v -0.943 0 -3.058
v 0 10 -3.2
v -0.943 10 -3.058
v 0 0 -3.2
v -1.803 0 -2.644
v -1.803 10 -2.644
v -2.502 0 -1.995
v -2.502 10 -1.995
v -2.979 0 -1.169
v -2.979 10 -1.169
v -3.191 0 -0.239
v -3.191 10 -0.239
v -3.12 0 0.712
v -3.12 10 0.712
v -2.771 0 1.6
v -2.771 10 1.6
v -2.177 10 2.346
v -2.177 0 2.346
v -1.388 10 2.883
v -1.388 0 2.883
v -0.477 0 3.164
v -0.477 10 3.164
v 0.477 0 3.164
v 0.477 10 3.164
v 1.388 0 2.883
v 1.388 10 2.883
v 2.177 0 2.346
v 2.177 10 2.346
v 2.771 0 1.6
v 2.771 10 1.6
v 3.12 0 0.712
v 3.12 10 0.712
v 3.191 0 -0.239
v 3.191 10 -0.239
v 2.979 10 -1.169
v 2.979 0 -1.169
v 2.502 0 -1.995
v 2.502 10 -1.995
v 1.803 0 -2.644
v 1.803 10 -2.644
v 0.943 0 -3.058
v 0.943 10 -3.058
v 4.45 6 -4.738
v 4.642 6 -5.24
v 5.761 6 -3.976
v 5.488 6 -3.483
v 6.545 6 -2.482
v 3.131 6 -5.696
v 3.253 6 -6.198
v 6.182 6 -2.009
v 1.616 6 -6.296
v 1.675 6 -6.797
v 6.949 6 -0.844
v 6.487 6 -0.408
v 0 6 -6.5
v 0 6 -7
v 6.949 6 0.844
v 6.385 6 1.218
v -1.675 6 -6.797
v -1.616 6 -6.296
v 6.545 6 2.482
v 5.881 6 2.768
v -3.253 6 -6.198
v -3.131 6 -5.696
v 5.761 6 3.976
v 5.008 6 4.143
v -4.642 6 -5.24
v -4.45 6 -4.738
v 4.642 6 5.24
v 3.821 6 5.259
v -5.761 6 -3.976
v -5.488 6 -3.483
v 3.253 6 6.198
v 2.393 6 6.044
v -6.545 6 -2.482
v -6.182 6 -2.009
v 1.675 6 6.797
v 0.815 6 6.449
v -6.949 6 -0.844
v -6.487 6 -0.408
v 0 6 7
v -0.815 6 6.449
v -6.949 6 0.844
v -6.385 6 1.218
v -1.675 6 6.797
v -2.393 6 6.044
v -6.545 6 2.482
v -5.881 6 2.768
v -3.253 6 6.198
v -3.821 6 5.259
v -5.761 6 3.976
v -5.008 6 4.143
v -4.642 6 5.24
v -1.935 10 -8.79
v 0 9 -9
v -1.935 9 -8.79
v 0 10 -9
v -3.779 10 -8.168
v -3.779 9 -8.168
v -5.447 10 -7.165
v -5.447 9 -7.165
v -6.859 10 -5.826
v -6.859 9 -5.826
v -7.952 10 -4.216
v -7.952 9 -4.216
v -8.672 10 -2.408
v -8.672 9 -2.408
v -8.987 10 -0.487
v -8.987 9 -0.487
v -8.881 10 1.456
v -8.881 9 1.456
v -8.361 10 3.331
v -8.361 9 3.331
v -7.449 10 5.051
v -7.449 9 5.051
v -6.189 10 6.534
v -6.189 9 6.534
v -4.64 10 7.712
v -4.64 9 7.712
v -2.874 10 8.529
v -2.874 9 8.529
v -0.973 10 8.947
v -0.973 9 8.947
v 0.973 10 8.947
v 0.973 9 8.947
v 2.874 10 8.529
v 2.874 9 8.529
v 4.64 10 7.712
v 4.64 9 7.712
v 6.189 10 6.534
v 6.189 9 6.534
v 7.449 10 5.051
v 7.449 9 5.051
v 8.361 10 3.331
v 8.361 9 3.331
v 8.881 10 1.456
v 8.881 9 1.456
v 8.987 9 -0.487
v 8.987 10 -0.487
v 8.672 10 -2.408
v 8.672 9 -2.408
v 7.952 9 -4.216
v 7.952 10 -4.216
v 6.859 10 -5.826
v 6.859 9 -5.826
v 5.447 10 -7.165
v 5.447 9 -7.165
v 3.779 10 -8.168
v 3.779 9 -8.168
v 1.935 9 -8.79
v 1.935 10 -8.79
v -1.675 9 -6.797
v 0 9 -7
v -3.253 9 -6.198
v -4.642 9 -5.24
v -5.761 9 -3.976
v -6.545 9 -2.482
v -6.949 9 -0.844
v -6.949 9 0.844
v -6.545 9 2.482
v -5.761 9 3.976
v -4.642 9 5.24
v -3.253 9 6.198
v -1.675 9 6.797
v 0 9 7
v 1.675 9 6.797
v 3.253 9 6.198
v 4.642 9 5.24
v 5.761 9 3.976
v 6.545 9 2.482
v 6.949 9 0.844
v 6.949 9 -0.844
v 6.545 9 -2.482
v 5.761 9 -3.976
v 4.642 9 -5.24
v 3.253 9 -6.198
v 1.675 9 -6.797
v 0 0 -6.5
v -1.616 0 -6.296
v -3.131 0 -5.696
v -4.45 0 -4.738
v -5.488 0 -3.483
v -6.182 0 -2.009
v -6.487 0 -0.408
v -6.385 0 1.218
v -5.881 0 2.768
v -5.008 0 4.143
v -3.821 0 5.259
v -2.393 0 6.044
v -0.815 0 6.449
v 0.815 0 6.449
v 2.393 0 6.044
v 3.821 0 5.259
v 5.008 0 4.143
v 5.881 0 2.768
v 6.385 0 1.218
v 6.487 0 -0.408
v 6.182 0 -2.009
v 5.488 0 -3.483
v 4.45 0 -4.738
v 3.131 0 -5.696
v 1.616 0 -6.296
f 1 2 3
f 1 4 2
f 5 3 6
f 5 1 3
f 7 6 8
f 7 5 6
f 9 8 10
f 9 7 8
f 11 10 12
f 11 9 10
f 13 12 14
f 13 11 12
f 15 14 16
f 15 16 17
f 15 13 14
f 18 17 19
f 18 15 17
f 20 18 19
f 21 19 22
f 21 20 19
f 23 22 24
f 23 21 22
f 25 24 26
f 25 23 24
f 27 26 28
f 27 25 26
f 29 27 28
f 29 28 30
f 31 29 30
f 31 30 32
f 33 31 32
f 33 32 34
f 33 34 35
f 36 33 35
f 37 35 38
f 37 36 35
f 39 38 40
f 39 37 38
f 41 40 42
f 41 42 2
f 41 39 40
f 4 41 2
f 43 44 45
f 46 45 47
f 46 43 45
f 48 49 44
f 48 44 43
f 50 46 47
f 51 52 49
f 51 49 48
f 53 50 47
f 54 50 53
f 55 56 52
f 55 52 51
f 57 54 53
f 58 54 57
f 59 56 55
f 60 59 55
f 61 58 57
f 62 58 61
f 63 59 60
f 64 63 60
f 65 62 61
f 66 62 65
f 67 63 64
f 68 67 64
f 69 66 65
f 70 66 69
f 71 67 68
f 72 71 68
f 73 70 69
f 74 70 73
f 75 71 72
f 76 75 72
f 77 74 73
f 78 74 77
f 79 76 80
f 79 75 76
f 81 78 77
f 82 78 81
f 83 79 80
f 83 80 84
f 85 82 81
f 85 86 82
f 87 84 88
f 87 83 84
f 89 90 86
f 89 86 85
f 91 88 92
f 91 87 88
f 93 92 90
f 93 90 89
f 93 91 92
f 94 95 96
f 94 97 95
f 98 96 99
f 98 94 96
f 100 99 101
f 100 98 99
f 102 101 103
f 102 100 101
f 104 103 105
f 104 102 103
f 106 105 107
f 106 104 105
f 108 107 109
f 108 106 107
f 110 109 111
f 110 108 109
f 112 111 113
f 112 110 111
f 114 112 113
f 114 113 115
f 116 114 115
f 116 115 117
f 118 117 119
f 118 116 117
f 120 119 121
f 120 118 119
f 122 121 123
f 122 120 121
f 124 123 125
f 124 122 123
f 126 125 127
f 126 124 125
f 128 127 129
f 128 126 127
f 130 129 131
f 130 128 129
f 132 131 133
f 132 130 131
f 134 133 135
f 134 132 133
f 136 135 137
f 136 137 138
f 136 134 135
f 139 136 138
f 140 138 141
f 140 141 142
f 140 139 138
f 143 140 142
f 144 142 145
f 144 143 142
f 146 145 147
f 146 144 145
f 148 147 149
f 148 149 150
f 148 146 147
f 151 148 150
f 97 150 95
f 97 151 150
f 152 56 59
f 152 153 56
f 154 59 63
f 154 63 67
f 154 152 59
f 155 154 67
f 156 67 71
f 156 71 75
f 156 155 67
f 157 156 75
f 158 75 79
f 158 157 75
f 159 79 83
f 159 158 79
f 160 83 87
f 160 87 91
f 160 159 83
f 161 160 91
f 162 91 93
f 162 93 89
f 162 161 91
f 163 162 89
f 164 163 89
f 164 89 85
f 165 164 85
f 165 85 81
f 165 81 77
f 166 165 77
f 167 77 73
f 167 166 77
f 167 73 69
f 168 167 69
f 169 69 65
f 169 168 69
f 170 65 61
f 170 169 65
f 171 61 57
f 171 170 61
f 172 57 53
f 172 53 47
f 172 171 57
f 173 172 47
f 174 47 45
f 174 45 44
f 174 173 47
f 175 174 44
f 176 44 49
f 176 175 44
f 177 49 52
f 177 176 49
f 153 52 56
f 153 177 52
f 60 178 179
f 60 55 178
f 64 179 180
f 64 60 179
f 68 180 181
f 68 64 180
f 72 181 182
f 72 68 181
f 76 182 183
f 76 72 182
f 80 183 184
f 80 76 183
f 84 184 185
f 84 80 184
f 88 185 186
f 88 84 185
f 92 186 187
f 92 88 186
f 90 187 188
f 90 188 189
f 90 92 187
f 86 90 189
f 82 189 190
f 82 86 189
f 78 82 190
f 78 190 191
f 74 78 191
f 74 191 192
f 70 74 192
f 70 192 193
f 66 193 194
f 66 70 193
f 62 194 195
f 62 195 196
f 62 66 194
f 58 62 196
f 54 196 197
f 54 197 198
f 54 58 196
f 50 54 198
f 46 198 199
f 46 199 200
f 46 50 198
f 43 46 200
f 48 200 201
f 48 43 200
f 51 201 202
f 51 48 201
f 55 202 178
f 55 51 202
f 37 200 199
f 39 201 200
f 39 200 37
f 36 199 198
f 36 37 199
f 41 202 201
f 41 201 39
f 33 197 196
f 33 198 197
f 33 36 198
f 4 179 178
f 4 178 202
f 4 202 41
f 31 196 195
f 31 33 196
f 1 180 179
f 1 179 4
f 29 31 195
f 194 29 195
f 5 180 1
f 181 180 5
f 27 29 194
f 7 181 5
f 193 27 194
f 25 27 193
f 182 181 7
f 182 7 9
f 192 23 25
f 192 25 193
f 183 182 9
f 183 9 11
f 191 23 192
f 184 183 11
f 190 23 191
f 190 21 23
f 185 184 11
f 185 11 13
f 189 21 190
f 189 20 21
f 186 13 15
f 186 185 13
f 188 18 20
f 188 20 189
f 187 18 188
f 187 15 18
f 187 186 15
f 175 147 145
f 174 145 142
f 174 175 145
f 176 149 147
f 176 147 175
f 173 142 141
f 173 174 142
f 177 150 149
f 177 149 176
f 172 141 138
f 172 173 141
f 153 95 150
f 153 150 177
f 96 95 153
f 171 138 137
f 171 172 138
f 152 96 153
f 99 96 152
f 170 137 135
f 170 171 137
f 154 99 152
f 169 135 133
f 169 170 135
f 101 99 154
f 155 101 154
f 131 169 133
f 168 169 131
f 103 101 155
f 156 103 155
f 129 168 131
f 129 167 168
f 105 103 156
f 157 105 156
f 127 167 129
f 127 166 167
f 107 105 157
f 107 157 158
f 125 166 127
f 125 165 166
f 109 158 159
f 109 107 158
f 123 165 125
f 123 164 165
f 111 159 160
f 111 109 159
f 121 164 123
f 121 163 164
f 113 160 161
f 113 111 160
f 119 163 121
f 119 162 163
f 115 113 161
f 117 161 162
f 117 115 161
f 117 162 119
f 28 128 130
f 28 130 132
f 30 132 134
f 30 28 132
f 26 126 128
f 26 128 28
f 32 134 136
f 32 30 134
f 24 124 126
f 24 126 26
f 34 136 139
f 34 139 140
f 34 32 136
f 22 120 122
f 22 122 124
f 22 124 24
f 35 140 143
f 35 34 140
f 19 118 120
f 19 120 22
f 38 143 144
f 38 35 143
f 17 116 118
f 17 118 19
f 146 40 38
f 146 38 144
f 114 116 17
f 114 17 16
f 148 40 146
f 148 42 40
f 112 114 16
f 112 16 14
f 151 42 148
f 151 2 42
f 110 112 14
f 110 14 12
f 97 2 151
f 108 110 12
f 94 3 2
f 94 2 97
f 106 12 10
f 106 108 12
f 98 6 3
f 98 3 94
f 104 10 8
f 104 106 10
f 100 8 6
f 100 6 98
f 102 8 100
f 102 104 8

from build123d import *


with BuildPart() as part:
    # 草图1 → Cable_gland_section (revolve)
    with BuildSketch(Plane.XY, mode=Mode.PRIVATE) as cable_gland_section_sk:
        Polygon((3.2, 0), (6.5, 0), (6.5, 6), (7, 6), (7, 9), (9, 9), (9, 10), (3.2, 10), align=None)
    revolve(cable_gland_section_sk.sketch.rotate(Axis((0, 0, 0), (0, 1, 0)), 90), axis=Axis((0, 0, 0), (0, 1, 0)))


solid = part.part
